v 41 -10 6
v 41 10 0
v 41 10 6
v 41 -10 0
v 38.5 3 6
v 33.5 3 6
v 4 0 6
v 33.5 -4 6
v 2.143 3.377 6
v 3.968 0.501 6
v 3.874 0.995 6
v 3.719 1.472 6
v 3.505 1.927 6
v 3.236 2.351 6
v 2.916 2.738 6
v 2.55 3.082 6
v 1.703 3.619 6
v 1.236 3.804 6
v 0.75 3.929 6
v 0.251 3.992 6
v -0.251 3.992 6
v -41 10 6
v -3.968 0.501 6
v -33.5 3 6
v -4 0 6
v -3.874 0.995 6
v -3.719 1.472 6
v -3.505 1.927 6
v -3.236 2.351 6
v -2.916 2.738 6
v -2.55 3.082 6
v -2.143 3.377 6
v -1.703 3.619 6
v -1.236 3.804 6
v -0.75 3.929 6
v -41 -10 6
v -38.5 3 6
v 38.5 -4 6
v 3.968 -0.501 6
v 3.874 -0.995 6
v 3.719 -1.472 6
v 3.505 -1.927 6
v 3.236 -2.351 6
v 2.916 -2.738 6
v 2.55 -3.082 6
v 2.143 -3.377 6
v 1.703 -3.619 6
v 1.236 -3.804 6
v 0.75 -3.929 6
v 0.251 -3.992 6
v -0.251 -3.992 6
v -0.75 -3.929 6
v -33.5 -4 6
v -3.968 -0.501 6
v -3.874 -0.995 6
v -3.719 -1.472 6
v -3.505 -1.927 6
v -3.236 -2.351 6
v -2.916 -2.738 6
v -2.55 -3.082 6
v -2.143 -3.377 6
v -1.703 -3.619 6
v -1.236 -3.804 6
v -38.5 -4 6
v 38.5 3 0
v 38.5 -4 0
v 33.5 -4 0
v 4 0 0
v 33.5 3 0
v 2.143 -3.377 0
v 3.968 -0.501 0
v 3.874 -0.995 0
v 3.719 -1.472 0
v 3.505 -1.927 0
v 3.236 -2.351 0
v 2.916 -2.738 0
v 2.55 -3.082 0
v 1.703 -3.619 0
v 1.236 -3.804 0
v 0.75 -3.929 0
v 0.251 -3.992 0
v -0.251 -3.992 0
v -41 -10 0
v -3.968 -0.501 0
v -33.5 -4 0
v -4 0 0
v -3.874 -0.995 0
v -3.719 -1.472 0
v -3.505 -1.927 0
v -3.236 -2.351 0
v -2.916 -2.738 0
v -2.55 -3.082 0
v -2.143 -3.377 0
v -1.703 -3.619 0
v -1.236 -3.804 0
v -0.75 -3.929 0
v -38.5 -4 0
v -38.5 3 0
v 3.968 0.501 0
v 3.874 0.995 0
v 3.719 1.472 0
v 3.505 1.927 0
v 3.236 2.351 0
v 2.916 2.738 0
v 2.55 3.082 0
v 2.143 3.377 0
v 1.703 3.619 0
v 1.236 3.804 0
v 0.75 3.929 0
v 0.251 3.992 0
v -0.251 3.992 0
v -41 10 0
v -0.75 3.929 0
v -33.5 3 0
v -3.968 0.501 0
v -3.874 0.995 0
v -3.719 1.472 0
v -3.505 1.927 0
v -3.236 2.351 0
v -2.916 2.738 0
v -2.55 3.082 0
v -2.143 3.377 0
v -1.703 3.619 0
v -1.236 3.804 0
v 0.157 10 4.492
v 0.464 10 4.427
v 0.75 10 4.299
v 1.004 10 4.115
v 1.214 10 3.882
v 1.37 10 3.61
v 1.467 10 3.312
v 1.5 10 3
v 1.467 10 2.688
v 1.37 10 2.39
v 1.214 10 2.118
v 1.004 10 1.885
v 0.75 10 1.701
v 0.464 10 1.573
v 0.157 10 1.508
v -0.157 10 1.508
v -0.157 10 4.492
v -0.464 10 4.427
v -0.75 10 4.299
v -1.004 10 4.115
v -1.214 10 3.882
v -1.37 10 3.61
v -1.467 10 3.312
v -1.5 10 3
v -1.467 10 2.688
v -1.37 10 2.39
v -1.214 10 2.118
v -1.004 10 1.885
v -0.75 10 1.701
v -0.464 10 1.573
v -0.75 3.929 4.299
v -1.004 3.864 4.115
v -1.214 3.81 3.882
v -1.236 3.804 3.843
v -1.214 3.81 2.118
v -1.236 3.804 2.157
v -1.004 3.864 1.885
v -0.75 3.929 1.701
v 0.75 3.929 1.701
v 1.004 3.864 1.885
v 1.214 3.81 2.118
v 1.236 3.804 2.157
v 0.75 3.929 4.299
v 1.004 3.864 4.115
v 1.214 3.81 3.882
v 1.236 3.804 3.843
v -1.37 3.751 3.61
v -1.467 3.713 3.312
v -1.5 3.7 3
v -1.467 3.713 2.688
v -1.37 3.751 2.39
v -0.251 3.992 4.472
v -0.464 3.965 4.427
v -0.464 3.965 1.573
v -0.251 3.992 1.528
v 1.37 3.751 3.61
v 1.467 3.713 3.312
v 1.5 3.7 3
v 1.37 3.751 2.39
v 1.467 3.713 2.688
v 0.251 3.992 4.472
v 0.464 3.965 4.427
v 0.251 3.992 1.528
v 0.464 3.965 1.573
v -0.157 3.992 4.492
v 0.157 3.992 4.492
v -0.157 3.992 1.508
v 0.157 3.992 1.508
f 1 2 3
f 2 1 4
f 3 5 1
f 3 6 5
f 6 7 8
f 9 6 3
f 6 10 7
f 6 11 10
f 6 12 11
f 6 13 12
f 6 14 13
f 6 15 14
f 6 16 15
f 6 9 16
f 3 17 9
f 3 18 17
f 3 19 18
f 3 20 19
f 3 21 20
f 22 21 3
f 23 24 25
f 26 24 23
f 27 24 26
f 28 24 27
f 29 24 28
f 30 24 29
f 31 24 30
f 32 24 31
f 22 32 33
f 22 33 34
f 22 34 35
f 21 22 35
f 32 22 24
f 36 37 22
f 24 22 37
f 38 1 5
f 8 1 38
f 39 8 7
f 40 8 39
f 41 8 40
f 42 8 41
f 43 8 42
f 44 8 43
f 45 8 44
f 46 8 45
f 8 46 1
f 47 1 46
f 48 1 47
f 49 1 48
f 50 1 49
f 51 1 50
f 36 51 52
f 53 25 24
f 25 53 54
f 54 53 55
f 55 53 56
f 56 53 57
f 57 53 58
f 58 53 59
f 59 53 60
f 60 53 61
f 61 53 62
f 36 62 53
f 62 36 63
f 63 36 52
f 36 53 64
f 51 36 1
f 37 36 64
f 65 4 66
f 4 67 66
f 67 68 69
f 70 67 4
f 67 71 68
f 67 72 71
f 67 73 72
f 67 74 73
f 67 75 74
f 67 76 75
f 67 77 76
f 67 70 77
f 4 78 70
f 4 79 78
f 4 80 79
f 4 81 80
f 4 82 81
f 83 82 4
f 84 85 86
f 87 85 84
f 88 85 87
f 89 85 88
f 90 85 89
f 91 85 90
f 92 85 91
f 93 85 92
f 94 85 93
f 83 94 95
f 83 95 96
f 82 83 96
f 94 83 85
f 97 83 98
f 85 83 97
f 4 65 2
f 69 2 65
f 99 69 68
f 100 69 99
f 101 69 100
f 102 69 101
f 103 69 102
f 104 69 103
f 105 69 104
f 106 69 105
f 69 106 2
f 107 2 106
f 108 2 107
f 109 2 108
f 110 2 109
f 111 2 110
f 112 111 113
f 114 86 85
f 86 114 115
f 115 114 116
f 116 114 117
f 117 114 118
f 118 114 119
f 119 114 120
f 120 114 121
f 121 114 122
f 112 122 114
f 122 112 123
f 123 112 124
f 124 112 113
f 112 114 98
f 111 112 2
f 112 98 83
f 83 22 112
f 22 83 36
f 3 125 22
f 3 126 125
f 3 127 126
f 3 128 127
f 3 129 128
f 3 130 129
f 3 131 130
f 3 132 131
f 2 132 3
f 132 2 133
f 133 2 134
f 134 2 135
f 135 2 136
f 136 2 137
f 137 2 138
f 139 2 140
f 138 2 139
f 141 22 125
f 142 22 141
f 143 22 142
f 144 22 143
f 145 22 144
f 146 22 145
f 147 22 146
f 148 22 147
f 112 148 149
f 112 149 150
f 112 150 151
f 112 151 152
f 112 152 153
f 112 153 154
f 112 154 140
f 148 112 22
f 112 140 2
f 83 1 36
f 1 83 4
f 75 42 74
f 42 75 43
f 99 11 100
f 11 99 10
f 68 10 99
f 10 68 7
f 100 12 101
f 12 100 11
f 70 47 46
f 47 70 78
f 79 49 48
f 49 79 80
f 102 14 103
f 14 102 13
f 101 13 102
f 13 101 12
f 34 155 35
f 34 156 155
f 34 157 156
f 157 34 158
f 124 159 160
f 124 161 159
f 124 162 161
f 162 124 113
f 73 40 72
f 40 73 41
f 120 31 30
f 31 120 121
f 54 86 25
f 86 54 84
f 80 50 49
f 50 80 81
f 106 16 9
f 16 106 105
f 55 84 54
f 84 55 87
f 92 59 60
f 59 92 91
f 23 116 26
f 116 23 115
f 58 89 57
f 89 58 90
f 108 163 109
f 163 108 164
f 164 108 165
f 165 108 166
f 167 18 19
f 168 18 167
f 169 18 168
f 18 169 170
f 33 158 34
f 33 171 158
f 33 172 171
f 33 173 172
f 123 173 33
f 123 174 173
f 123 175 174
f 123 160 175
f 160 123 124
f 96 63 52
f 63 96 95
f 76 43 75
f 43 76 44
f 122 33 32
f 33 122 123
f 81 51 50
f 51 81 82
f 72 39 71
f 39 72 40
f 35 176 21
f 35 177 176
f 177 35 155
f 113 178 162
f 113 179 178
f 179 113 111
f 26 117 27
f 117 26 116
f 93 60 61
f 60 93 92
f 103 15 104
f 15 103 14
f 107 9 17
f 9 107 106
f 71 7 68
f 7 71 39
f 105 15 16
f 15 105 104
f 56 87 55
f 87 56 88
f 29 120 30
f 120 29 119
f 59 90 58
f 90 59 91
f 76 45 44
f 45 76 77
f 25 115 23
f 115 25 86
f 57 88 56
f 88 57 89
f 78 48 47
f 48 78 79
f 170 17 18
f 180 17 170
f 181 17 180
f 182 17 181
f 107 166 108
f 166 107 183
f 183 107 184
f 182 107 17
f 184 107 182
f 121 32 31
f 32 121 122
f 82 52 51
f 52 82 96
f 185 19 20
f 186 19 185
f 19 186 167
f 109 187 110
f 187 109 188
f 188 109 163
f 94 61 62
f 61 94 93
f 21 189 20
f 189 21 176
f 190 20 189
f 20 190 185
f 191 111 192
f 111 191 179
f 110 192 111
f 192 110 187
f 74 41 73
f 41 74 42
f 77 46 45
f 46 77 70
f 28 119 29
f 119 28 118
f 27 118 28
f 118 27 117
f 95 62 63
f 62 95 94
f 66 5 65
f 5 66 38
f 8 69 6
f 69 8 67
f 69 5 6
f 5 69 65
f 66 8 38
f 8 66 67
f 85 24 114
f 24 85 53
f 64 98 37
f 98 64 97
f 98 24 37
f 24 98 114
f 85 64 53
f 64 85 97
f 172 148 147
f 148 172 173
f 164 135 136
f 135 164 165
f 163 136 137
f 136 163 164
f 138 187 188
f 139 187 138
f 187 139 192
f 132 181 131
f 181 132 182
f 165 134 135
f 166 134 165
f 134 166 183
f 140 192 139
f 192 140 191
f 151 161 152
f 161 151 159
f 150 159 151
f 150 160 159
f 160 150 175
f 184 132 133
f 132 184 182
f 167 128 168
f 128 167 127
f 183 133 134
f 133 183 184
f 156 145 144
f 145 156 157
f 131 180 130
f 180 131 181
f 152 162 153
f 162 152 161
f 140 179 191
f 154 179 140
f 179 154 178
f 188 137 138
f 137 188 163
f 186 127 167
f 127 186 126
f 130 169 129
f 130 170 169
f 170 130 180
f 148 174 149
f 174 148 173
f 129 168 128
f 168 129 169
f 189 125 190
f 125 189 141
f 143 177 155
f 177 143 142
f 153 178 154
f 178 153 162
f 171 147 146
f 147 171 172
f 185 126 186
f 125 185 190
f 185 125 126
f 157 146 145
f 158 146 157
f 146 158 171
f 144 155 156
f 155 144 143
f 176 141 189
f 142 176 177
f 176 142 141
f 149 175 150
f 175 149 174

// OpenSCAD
module ghidaj_support()
{
        difference(){
                translate ([-41,-10,0]) cube ([82, 20, 6], center = false);
                cylinder (r = 4, h = 6, center = false, $fn = 50);
                translate([33.5, -4, 0]) cube([5, 7, 6], center = false);
                translate([-38.5, -4, 0]) cube([5, 7, 6], center = false);
                translate([0,0,3])rotate([-90,0,0]) cylinder(h = 12, r = 1.5, $fn = 30);
        }
}
ghidaj_support();
